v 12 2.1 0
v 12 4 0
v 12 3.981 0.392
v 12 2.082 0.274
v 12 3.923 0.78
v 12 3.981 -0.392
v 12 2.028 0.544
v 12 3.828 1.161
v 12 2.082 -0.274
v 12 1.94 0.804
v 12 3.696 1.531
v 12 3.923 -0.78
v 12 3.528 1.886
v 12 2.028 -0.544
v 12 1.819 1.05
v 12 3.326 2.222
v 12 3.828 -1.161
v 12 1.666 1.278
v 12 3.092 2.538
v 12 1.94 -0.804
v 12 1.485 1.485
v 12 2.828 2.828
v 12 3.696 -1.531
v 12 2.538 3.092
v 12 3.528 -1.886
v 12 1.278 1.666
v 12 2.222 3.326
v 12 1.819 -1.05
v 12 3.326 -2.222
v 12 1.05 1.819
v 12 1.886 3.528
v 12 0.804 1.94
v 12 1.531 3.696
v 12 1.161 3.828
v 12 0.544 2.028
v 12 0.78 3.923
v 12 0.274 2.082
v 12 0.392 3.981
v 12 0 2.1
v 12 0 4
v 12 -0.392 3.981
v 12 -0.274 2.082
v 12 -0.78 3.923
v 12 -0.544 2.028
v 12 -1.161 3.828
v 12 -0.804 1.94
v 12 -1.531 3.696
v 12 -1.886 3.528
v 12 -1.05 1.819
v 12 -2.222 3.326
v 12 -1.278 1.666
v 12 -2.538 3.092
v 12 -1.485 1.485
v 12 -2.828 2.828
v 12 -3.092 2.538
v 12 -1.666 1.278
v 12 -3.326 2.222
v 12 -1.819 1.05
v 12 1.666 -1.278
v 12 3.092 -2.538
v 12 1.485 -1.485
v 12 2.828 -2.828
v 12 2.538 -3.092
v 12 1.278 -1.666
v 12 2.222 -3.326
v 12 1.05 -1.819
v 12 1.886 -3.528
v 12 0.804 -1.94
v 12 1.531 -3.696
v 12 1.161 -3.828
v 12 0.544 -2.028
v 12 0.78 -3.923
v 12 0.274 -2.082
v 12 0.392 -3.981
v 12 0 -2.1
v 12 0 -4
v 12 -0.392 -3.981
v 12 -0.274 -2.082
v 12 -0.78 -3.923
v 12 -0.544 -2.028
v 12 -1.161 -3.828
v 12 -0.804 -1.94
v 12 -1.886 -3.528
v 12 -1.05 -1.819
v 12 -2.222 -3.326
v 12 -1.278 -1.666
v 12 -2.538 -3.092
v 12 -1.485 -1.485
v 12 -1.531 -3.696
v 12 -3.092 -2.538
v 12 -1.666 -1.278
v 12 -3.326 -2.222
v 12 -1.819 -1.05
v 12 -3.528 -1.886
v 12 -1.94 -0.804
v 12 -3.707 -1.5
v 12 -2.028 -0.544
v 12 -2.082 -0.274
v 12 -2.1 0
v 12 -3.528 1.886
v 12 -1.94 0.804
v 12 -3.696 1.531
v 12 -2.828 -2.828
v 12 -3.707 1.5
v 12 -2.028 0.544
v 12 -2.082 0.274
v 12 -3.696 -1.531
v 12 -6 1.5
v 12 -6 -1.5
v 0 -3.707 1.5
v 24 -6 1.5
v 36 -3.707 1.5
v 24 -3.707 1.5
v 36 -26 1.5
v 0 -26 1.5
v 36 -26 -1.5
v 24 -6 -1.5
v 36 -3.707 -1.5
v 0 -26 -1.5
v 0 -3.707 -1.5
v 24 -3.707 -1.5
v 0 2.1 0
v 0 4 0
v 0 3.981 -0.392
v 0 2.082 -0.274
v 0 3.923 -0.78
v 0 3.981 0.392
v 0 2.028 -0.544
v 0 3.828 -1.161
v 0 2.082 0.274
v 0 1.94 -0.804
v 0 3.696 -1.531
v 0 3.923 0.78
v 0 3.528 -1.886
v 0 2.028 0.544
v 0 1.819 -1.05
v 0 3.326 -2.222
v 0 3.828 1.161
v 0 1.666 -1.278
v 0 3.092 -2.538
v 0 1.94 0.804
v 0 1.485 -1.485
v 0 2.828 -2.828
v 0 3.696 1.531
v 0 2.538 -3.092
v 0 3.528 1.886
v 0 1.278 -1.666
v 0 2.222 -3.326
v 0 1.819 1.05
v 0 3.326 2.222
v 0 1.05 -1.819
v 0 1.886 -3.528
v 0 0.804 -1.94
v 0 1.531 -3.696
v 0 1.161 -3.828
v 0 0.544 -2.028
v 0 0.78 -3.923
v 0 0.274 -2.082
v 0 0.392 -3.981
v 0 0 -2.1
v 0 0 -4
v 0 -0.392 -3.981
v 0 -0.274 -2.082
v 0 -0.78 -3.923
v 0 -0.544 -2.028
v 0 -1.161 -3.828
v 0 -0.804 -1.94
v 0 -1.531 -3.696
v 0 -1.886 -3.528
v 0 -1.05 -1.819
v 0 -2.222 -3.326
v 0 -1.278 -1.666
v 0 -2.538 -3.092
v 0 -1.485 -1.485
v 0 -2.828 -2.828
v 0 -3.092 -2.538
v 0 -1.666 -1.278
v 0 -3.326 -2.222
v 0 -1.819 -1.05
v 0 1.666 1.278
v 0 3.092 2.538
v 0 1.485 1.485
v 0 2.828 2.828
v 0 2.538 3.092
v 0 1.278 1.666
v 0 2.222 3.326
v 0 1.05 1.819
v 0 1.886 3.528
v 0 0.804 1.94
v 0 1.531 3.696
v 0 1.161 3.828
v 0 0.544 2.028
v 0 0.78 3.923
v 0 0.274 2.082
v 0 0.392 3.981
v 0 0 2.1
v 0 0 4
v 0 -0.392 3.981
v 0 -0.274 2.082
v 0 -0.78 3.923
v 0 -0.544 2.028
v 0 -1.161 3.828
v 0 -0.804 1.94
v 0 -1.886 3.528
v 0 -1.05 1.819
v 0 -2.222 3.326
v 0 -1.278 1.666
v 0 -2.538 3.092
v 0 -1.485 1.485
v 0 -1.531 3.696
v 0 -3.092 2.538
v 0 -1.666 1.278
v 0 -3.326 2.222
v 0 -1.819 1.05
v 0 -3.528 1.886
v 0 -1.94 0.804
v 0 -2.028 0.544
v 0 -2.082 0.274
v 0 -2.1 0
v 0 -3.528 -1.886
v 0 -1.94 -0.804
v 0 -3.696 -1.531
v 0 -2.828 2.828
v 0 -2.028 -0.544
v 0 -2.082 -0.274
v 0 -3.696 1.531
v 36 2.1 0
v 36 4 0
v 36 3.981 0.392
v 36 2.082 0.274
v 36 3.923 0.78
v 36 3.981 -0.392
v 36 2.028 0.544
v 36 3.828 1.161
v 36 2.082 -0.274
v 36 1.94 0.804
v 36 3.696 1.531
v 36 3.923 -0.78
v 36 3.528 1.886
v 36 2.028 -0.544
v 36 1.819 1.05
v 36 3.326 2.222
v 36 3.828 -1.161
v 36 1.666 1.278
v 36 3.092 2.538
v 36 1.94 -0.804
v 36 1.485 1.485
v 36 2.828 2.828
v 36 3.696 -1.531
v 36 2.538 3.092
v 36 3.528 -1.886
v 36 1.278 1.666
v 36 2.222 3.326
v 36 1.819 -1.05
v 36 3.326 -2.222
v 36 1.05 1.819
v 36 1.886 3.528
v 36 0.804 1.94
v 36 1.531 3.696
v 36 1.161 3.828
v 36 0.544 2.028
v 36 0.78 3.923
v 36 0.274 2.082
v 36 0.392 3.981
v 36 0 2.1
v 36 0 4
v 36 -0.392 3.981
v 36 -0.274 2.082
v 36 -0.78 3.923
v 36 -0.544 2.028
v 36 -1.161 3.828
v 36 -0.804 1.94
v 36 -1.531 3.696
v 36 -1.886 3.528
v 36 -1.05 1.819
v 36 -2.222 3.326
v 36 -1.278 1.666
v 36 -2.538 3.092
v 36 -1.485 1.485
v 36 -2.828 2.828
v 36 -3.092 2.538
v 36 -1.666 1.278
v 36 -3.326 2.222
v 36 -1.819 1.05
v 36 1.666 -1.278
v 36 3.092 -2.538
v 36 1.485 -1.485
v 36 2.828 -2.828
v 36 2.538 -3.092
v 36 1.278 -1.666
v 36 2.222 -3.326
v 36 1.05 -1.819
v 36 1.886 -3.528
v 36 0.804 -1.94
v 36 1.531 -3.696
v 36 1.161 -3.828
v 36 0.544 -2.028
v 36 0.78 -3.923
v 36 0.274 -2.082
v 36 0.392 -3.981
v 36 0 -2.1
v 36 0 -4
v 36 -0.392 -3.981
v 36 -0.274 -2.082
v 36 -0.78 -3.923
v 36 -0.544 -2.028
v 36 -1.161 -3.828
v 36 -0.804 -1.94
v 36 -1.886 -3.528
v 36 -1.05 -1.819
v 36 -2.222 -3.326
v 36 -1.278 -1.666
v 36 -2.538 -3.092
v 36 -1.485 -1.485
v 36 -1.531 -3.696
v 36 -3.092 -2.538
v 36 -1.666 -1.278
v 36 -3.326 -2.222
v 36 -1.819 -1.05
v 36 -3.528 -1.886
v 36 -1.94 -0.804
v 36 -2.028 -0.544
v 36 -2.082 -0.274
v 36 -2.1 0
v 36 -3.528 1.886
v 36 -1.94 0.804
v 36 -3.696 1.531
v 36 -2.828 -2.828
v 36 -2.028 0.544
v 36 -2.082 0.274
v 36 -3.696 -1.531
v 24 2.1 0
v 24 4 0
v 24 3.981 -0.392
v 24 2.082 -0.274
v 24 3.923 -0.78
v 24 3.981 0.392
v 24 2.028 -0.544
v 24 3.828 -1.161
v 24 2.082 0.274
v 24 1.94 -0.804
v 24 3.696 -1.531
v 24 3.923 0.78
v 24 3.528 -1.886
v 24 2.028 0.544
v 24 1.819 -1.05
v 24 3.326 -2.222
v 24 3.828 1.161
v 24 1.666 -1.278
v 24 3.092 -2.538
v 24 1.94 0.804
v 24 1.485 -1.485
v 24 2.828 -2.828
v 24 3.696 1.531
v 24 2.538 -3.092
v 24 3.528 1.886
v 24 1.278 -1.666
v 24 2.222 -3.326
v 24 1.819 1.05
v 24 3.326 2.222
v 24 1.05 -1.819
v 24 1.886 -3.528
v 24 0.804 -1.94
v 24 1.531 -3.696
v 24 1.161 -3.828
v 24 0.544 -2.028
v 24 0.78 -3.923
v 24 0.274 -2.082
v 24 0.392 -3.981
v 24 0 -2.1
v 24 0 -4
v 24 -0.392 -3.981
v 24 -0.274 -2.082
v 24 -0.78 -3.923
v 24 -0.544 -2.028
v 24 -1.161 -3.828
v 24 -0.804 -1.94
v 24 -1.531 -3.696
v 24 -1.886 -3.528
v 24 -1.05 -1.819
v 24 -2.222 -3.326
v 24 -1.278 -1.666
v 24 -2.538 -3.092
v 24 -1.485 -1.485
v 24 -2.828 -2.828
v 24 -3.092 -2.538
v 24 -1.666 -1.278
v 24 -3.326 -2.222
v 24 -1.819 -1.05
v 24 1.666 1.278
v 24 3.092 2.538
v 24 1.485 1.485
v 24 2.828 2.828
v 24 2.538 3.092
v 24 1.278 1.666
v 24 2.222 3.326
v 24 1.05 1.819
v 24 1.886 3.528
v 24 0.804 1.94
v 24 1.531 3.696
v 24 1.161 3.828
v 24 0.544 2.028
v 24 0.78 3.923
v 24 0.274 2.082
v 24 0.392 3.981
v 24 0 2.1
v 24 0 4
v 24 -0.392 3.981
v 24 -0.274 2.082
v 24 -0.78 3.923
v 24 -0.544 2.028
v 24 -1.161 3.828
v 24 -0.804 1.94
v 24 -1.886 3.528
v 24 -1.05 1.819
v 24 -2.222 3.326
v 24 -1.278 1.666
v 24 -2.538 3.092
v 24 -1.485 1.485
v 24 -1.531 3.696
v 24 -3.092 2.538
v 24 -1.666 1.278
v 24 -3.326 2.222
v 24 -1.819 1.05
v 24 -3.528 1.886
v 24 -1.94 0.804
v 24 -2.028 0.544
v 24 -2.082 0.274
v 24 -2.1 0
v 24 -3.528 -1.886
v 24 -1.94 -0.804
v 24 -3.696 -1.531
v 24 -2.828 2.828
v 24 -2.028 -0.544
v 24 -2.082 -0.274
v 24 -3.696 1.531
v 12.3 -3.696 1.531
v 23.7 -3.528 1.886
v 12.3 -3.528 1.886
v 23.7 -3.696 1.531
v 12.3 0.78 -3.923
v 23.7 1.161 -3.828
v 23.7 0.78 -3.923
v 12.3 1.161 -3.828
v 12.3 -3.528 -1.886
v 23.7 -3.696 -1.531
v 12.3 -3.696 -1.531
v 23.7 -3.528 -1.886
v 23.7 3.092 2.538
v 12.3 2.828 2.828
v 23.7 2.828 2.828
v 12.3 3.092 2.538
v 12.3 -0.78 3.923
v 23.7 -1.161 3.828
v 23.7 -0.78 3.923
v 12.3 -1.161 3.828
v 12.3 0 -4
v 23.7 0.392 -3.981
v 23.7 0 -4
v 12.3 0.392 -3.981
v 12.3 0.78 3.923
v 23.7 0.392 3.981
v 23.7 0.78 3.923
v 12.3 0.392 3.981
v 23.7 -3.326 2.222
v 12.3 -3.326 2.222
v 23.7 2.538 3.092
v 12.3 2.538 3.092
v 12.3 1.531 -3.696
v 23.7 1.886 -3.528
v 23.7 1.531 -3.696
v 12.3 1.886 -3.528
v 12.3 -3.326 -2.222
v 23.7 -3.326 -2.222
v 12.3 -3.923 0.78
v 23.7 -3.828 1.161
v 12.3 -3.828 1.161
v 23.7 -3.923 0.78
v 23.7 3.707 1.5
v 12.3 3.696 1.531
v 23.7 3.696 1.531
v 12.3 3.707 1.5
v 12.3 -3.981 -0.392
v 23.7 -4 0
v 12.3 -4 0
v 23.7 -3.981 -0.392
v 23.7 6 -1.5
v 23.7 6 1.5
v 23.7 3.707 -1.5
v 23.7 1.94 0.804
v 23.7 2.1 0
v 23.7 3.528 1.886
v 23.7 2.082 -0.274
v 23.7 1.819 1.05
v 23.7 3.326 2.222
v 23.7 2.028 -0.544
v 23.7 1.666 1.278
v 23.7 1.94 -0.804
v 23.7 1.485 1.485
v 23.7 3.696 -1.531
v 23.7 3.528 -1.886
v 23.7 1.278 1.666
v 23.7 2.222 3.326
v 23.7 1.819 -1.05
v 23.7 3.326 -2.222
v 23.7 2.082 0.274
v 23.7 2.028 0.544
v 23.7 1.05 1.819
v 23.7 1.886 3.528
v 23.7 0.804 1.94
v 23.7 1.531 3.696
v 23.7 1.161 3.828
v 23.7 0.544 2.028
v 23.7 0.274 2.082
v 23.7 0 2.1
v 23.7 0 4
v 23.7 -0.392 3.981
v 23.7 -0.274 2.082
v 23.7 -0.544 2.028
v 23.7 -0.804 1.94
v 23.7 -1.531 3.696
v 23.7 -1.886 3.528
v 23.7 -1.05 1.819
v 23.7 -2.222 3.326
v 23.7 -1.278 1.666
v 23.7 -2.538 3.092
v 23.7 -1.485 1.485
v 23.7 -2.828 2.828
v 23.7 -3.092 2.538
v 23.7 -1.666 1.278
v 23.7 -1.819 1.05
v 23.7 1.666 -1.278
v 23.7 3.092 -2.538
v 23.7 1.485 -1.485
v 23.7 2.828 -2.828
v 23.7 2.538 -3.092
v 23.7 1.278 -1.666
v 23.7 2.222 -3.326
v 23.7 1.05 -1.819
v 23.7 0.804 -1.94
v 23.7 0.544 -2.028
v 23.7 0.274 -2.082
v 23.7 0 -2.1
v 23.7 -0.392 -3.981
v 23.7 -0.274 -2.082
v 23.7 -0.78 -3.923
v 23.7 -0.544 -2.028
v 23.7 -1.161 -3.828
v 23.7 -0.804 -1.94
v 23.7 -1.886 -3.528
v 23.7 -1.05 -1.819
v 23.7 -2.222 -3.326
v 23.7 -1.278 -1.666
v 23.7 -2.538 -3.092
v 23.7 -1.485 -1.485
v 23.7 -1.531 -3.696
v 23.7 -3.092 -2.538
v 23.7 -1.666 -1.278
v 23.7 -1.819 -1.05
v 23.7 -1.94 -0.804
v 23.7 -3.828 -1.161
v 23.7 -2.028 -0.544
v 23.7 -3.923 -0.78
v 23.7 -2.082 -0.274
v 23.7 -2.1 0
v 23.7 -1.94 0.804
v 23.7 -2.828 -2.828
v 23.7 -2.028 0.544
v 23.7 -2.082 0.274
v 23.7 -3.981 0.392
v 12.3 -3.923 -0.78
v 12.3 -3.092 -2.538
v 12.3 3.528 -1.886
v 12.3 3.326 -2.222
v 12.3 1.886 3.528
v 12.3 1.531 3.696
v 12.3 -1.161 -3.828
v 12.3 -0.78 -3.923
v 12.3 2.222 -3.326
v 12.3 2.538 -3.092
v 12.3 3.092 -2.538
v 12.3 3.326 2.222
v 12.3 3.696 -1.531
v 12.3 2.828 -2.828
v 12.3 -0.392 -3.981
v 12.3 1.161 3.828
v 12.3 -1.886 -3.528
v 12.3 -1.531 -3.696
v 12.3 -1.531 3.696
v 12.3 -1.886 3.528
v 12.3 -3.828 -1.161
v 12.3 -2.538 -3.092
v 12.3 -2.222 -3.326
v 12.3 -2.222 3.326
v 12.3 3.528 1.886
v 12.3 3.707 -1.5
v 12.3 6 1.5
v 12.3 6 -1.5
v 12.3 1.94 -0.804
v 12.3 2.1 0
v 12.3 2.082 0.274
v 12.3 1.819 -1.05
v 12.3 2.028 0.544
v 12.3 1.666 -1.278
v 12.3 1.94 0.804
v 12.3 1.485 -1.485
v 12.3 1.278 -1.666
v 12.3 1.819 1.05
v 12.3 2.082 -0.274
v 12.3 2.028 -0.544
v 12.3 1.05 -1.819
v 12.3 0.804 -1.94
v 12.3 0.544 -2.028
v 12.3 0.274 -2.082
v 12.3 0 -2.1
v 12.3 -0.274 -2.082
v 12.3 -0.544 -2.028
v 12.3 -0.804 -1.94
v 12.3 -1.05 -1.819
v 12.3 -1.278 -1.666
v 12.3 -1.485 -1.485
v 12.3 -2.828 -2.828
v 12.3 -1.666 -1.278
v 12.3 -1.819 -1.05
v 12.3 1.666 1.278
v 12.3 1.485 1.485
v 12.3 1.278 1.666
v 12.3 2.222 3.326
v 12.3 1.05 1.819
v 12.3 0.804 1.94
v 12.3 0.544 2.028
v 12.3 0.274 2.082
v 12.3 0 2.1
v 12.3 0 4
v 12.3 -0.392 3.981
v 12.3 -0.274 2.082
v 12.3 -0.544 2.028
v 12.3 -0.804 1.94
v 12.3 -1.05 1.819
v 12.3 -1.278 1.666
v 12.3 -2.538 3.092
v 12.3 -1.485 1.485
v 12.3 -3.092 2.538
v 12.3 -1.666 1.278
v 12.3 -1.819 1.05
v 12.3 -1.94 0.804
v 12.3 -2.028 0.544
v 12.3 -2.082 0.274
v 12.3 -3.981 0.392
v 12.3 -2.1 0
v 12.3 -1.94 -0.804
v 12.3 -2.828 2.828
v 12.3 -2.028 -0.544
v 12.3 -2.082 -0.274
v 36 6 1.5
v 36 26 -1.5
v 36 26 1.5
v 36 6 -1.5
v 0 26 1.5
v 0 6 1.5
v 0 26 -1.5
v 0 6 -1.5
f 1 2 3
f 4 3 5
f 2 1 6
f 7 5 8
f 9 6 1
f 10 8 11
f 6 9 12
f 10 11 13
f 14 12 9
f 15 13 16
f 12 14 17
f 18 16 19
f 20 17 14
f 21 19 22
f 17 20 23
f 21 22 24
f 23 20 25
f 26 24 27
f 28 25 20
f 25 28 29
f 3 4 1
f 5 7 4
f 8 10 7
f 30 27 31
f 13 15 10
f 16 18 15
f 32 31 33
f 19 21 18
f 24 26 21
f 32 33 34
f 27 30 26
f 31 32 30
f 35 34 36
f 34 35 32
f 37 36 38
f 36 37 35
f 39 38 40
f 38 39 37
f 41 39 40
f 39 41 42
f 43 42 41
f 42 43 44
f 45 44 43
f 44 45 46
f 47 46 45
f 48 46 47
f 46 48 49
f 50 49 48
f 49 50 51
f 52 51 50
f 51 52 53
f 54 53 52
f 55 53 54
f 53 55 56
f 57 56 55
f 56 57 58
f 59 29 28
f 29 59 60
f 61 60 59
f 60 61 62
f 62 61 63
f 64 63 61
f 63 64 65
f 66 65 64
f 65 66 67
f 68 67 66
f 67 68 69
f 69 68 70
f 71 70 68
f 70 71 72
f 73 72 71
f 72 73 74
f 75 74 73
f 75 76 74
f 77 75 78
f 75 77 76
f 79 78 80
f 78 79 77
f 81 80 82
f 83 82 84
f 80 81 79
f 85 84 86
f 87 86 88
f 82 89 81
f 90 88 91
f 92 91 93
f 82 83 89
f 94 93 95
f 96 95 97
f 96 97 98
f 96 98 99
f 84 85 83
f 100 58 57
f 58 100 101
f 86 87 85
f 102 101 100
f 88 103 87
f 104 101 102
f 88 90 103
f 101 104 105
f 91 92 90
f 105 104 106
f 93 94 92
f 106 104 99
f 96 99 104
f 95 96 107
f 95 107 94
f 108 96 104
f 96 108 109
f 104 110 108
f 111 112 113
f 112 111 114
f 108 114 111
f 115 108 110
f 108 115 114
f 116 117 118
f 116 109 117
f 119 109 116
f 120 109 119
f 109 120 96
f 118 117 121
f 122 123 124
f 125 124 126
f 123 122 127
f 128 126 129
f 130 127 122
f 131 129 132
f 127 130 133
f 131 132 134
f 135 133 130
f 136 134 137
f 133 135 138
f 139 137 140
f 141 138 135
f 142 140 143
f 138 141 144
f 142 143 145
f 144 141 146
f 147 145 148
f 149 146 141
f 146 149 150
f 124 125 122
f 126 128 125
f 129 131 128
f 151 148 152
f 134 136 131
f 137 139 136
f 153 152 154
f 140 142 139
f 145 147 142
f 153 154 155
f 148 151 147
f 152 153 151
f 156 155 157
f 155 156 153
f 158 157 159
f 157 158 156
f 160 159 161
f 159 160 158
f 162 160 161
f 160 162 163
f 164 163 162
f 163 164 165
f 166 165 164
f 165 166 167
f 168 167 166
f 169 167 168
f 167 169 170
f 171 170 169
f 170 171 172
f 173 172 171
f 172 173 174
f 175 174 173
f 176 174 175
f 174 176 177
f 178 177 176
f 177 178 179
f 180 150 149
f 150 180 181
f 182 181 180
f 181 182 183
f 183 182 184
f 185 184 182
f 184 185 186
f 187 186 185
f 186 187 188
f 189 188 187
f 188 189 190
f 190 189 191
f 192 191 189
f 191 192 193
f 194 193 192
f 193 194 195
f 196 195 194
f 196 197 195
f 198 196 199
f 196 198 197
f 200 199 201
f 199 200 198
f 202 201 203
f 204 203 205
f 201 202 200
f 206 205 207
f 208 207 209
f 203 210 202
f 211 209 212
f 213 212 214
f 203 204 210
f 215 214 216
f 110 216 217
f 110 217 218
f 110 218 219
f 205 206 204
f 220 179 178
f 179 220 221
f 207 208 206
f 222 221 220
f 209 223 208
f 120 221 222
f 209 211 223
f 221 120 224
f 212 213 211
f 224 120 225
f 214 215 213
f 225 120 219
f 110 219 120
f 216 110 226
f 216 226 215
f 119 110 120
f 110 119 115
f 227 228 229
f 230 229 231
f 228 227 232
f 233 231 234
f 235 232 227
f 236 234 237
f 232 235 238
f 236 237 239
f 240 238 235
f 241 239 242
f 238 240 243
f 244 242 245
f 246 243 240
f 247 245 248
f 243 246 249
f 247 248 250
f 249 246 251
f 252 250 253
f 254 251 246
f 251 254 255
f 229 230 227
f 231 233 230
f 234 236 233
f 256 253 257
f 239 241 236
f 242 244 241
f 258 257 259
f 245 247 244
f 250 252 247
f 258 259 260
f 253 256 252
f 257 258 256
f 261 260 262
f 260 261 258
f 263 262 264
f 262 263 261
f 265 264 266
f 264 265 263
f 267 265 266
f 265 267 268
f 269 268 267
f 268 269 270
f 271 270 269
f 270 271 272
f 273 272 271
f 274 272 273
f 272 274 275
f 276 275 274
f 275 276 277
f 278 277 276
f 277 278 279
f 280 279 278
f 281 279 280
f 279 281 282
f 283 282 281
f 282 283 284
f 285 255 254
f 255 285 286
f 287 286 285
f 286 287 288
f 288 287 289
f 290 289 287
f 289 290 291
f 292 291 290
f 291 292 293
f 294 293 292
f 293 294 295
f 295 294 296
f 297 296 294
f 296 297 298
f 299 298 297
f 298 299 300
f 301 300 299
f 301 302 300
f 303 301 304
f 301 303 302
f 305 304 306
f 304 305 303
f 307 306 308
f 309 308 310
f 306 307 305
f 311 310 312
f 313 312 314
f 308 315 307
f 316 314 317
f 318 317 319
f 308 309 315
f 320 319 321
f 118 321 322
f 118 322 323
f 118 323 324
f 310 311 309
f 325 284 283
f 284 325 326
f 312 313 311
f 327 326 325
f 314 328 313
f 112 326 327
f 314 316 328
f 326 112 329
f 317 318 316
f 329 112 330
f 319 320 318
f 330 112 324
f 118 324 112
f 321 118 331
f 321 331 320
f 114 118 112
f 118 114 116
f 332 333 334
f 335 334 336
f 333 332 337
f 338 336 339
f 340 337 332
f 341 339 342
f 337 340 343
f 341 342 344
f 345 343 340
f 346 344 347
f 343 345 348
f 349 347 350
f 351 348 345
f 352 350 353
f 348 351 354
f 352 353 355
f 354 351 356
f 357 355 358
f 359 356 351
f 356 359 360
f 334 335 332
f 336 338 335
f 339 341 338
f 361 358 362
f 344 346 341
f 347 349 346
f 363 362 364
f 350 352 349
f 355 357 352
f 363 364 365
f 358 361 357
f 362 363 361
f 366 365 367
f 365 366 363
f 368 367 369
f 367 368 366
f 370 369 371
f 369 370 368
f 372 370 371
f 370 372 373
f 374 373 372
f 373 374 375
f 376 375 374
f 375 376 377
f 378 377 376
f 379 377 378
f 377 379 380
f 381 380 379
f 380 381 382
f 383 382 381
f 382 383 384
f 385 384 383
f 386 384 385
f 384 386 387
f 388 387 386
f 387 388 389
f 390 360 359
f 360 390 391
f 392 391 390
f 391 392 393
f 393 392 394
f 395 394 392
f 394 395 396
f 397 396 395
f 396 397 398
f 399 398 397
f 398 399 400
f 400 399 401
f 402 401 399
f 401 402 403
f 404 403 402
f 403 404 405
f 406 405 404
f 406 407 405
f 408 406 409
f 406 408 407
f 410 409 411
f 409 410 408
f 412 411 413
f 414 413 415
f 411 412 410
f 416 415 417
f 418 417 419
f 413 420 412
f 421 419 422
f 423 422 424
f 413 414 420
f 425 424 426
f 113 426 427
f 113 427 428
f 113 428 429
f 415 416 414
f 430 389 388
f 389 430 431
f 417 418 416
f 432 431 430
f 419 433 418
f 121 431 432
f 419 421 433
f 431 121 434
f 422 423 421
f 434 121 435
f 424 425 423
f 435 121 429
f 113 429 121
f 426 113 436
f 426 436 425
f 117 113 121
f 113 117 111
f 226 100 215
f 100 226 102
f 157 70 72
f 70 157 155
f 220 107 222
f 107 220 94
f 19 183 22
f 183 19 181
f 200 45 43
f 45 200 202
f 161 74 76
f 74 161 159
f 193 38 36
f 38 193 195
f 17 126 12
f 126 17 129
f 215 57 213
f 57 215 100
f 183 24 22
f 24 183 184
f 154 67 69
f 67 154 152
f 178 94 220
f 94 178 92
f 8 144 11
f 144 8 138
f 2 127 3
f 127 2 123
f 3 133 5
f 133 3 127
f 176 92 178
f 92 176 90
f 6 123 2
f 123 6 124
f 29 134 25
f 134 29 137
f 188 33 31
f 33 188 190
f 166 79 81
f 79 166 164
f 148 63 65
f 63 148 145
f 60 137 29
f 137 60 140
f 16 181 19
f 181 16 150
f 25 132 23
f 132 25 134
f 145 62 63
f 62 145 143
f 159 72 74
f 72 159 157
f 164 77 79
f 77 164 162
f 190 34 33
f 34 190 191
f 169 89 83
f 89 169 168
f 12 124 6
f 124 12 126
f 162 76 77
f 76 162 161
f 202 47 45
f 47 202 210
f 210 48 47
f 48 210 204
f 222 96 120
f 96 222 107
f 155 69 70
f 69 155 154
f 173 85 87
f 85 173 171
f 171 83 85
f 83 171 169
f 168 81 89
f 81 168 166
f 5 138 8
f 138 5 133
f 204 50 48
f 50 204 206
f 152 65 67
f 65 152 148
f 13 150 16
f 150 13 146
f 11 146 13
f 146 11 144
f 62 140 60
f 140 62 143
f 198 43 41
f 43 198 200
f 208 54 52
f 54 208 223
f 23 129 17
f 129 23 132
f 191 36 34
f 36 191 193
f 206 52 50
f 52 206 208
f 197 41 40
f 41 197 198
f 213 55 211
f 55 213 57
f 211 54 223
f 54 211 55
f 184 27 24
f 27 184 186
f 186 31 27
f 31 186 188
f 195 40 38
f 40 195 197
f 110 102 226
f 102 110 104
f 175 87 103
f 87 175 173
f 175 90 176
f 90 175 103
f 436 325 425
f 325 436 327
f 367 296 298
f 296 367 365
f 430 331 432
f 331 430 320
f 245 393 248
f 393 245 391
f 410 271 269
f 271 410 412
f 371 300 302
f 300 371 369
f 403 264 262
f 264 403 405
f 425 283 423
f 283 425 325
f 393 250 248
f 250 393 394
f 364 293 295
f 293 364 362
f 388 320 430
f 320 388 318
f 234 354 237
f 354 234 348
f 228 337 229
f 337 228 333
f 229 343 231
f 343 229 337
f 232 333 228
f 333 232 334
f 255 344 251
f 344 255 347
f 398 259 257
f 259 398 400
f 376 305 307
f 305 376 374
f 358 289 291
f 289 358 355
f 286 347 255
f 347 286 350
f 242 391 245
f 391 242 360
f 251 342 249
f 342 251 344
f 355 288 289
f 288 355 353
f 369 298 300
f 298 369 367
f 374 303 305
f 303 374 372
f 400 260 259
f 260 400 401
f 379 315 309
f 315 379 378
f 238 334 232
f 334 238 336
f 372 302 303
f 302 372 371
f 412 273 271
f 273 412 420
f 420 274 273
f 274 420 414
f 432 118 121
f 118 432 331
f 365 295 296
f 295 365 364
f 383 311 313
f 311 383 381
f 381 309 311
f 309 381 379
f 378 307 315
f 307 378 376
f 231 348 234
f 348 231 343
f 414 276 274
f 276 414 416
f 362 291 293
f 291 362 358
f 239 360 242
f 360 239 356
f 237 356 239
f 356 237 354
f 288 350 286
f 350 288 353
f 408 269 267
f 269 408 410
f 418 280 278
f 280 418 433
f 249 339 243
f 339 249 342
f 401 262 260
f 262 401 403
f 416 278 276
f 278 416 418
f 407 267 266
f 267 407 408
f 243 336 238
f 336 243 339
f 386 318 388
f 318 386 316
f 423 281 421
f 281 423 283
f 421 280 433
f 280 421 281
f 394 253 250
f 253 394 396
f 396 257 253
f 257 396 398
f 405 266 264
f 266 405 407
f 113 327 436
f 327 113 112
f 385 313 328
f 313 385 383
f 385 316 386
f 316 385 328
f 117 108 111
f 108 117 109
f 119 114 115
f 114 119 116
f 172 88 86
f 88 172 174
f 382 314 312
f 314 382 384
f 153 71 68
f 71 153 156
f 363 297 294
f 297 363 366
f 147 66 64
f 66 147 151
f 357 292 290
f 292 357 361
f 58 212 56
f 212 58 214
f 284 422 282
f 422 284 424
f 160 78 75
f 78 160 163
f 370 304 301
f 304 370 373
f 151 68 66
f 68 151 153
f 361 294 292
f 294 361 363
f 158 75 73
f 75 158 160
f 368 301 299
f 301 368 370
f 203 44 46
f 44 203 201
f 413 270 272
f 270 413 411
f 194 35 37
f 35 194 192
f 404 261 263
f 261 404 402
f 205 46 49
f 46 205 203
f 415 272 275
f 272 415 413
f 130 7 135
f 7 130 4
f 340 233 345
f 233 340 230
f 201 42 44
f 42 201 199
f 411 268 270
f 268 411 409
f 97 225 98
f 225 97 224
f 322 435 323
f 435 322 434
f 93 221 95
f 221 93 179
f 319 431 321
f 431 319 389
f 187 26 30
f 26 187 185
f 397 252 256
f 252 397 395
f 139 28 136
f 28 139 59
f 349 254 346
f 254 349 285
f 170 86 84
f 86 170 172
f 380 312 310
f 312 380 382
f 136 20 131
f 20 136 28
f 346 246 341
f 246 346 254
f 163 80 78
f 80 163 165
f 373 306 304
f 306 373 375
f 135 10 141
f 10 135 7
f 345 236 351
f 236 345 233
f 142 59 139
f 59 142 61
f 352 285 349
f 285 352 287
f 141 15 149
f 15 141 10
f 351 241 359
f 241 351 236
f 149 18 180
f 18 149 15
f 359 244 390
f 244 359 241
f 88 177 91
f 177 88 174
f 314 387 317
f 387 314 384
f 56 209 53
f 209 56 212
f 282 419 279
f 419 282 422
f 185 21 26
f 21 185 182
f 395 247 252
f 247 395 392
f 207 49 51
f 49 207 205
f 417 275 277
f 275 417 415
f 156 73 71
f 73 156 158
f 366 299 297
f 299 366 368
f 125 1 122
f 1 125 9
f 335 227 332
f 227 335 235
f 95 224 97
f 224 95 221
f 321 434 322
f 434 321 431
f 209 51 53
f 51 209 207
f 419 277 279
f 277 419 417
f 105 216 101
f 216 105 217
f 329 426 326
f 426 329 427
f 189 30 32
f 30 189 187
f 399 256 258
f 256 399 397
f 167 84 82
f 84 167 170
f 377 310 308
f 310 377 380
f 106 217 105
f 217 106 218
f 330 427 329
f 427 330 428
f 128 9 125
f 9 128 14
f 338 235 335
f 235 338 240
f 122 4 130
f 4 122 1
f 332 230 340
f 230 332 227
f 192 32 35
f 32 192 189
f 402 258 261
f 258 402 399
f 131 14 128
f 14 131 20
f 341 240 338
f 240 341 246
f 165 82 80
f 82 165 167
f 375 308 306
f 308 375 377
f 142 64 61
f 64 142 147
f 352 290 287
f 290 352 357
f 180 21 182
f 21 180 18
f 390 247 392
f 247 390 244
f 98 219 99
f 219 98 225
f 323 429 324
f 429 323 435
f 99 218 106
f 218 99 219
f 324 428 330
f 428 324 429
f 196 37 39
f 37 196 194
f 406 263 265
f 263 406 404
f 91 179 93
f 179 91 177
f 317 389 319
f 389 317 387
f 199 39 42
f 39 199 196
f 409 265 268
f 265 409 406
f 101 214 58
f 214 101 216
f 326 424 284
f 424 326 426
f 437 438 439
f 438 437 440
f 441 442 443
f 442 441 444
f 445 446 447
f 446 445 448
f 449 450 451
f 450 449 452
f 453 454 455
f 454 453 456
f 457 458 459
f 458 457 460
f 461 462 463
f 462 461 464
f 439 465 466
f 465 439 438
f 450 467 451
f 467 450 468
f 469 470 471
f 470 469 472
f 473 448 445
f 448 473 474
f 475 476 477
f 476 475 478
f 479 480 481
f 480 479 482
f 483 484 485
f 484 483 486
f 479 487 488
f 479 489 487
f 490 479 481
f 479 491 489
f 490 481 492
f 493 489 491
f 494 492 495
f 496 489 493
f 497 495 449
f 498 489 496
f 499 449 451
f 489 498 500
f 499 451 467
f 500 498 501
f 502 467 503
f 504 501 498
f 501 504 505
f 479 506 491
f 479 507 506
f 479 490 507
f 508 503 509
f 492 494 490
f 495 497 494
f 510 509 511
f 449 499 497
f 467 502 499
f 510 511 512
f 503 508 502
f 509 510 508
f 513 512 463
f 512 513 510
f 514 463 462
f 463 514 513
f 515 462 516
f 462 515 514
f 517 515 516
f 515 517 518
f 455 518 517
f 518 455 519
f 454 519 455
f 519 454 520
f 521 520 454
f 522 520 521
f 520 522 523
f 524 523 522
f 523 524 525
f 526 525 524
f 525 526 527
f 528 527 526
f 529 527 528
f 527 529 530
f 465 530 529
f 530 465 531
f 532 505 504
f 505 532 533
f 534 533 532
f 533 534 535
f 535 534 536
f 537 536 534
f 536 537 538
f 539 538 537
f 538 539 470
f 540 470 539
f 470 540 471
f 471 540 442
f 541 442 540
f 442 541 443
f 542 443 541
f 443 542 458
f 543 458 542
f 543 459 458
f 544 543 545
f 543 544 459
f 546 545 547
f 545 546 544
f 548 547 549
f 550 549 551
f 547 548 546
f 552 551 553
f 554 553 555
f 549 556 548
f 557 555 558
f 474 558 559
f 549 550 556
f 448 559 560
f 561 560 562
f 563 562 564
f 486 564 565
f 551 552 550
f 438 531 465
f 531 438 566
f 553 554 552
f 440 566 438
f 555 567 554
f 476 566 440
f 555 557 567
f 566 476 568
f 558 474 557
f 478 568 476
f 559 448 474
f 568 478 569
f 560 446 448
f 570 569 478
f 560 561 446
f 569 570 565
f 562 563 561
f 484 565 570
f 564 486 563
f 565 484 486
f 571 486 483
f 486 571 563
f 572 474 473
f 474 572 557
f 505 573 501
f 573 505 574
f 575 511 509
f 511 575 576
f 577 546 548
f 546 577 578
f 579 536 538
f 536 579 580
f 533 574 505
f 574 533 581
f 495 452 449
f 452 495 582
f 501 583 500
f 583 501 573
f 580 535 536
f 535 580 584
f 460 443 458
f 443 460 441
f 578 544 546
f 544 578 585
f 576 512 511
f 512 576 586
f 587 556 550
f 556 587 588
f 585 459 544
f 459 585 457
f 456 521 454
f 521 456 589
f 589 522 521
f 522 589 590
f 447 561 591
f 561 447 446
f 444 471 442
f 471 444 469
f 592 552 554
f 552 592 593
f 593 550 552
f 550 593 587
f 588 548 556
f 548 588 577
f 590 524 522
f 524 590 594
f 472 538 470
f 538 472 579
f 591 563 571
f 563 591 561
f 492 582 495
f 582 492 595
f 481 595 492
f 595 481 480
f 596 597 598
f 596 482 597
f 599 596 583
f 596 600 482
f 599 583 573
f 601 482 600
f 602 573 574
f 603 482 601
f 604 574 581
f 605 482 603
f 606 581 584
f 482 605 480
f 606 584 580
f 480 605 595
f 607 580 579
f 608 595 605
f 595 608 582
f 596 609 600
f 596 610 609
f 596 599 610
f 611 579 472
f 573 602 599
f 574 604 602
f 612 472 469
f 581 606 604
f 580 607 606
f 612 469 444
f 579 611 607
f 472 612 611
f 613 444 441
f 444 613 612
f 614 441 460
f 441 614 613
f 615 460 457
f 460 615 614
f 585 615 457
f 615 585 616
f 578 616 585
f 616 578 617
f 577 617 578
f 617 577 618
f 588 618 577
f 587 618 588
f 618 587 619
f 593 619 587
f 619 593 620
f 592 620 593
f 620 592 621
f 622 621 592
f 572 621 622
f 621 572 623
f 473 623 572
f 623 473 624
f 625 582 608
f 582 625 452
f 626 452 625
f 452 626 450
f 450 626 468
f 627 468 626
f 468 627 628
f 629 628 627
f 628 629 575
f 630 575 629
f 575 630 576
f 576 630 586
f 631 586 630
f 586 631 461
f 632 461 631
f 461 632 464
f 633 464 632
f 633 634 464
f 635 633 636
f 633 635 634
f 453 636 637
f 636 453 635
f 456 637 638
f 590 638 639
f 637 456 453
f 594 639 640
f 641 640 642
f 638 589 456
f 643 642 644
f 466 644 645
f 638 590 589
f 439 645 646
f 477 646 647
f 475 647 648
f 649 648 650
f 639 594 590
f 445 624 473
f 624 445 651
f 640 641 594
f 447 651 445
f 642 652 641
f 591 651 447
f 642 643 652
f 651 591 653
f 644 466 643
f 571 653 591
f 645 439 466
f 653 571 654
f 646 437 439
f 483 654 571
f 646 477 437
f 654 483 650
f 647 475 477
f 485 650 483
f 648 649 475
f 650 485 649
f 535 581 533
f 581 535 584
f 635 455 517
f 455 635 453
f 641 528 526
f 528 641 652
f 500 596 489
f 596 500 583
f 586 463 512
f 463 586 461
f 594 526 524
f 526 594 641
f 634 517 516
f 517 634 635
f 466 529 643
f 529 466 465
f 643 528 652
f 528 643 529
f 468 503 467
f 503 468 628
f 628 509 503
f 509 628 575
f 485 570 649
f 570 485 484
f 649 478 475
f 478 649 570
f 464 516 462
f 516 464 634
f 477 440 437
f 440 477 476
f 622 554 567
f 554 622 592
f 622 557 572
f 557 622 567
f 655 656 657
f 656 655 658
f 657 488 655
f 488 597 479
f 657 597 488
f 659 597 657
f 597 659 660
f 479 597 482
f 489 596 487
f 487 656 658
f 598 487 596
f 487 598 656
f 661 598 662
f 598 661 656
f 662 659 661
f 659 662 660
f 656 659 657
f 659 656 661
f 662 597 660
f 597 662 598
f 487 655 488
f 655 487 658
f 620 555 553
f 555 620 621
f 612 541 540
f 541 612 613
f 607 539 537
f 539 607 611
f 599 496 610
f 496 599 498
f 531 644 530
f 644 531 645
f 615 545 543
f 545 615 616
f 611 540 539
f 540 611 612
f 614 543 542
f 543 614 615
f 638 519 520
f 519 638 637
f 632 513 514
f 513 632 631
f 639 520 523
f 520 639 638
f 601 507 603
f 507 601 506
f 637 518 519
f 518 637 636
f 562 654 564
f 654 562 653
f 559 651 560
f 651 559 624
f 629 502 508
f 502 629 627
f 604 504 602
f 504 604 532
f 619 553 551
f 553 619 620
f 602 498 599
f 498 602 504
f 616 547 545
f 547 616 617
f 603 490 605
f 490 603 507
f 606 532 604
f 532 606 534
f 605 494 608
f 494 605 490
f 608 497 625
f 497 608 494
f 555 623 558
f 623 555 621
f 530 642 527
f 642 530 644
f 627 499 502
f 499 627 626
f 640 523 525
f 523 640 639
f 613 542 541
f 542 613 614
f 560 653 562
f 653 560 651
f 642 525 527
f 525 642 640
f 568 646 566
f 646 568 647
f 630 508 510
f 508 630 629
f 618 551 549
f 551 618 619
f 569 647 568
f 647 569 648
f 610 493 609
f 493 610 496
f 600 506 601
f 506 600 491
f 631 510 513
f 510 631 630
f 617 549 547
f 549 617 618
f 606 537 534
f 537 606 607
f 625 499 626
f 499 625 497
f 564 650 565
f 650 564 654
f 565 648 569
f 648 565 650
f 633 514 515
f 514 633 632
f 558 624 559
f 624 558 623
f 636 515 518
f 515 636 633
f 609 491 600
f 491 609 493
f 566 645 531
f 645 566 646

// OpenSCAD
// Two-leaf hinge printed in the assembled position.
// Leaf A owns the outer knuckles, leaf B the middle one; an axial gap keeps
// the knuckles clear of each other and a shared bore accepts the pin.
width_x = 36;
knuckle_r = 4;
bore_d = 4.2;
knuckle_gap = 0.3;
leaf_t = 3;
leaf_depth = 20;
web_depth = 7;

module bore() {
    translate([-1, 0, 0])
        rotate([0, 90, 0])
            cylinder(h = width_x + 2, d = bore_d, $fn = 48);
}

module knuckle(x0, x1) {
    translate([x0, 0, 0])
        rotate([0, 90, 0])
            cylinder(h = x1 - x0, r = knuckle_r, $fn = 64);
}

module leaf_a() {
    difference() {
        union() {
            knuckle(0, width_x / 3);
            knuckle(2 * width_x / 3, width_x);
            translate([0, -(knuckle_r + 2 + leaf_depth), -leaf_t / 2])
                cube([width_x, leaf_depth, leaf_t]);
            for (x0 = [0, 2 * width_x / 3])
                translate([x0, -(knuckle_r + 3), -leaf_t / 2])
                    cube([width_x / 3, web_depth, leaf_t]);
        }
        bore();
    }
}

module leaf_b() {
    difference() {
        union() {
            knuckle(width_x / 3 + knuckle_gap, 2 * width_x / 3 - knuckle_gap);
            translate([0, knuckle_r + 2, -leaf_t / 2])
                cube([width_x, leaf_depth, leaf_t]);
            translate([width_x / 3 + knuckle_gap, -knuckle_r + 1, -leaf_t / 2])
                cube([width_x / 3 - 2 * knuckle_gap, web_depth + 3, leaf_t]);
        }
        bore();
    }
}

leaf_a();
leaf_b();
